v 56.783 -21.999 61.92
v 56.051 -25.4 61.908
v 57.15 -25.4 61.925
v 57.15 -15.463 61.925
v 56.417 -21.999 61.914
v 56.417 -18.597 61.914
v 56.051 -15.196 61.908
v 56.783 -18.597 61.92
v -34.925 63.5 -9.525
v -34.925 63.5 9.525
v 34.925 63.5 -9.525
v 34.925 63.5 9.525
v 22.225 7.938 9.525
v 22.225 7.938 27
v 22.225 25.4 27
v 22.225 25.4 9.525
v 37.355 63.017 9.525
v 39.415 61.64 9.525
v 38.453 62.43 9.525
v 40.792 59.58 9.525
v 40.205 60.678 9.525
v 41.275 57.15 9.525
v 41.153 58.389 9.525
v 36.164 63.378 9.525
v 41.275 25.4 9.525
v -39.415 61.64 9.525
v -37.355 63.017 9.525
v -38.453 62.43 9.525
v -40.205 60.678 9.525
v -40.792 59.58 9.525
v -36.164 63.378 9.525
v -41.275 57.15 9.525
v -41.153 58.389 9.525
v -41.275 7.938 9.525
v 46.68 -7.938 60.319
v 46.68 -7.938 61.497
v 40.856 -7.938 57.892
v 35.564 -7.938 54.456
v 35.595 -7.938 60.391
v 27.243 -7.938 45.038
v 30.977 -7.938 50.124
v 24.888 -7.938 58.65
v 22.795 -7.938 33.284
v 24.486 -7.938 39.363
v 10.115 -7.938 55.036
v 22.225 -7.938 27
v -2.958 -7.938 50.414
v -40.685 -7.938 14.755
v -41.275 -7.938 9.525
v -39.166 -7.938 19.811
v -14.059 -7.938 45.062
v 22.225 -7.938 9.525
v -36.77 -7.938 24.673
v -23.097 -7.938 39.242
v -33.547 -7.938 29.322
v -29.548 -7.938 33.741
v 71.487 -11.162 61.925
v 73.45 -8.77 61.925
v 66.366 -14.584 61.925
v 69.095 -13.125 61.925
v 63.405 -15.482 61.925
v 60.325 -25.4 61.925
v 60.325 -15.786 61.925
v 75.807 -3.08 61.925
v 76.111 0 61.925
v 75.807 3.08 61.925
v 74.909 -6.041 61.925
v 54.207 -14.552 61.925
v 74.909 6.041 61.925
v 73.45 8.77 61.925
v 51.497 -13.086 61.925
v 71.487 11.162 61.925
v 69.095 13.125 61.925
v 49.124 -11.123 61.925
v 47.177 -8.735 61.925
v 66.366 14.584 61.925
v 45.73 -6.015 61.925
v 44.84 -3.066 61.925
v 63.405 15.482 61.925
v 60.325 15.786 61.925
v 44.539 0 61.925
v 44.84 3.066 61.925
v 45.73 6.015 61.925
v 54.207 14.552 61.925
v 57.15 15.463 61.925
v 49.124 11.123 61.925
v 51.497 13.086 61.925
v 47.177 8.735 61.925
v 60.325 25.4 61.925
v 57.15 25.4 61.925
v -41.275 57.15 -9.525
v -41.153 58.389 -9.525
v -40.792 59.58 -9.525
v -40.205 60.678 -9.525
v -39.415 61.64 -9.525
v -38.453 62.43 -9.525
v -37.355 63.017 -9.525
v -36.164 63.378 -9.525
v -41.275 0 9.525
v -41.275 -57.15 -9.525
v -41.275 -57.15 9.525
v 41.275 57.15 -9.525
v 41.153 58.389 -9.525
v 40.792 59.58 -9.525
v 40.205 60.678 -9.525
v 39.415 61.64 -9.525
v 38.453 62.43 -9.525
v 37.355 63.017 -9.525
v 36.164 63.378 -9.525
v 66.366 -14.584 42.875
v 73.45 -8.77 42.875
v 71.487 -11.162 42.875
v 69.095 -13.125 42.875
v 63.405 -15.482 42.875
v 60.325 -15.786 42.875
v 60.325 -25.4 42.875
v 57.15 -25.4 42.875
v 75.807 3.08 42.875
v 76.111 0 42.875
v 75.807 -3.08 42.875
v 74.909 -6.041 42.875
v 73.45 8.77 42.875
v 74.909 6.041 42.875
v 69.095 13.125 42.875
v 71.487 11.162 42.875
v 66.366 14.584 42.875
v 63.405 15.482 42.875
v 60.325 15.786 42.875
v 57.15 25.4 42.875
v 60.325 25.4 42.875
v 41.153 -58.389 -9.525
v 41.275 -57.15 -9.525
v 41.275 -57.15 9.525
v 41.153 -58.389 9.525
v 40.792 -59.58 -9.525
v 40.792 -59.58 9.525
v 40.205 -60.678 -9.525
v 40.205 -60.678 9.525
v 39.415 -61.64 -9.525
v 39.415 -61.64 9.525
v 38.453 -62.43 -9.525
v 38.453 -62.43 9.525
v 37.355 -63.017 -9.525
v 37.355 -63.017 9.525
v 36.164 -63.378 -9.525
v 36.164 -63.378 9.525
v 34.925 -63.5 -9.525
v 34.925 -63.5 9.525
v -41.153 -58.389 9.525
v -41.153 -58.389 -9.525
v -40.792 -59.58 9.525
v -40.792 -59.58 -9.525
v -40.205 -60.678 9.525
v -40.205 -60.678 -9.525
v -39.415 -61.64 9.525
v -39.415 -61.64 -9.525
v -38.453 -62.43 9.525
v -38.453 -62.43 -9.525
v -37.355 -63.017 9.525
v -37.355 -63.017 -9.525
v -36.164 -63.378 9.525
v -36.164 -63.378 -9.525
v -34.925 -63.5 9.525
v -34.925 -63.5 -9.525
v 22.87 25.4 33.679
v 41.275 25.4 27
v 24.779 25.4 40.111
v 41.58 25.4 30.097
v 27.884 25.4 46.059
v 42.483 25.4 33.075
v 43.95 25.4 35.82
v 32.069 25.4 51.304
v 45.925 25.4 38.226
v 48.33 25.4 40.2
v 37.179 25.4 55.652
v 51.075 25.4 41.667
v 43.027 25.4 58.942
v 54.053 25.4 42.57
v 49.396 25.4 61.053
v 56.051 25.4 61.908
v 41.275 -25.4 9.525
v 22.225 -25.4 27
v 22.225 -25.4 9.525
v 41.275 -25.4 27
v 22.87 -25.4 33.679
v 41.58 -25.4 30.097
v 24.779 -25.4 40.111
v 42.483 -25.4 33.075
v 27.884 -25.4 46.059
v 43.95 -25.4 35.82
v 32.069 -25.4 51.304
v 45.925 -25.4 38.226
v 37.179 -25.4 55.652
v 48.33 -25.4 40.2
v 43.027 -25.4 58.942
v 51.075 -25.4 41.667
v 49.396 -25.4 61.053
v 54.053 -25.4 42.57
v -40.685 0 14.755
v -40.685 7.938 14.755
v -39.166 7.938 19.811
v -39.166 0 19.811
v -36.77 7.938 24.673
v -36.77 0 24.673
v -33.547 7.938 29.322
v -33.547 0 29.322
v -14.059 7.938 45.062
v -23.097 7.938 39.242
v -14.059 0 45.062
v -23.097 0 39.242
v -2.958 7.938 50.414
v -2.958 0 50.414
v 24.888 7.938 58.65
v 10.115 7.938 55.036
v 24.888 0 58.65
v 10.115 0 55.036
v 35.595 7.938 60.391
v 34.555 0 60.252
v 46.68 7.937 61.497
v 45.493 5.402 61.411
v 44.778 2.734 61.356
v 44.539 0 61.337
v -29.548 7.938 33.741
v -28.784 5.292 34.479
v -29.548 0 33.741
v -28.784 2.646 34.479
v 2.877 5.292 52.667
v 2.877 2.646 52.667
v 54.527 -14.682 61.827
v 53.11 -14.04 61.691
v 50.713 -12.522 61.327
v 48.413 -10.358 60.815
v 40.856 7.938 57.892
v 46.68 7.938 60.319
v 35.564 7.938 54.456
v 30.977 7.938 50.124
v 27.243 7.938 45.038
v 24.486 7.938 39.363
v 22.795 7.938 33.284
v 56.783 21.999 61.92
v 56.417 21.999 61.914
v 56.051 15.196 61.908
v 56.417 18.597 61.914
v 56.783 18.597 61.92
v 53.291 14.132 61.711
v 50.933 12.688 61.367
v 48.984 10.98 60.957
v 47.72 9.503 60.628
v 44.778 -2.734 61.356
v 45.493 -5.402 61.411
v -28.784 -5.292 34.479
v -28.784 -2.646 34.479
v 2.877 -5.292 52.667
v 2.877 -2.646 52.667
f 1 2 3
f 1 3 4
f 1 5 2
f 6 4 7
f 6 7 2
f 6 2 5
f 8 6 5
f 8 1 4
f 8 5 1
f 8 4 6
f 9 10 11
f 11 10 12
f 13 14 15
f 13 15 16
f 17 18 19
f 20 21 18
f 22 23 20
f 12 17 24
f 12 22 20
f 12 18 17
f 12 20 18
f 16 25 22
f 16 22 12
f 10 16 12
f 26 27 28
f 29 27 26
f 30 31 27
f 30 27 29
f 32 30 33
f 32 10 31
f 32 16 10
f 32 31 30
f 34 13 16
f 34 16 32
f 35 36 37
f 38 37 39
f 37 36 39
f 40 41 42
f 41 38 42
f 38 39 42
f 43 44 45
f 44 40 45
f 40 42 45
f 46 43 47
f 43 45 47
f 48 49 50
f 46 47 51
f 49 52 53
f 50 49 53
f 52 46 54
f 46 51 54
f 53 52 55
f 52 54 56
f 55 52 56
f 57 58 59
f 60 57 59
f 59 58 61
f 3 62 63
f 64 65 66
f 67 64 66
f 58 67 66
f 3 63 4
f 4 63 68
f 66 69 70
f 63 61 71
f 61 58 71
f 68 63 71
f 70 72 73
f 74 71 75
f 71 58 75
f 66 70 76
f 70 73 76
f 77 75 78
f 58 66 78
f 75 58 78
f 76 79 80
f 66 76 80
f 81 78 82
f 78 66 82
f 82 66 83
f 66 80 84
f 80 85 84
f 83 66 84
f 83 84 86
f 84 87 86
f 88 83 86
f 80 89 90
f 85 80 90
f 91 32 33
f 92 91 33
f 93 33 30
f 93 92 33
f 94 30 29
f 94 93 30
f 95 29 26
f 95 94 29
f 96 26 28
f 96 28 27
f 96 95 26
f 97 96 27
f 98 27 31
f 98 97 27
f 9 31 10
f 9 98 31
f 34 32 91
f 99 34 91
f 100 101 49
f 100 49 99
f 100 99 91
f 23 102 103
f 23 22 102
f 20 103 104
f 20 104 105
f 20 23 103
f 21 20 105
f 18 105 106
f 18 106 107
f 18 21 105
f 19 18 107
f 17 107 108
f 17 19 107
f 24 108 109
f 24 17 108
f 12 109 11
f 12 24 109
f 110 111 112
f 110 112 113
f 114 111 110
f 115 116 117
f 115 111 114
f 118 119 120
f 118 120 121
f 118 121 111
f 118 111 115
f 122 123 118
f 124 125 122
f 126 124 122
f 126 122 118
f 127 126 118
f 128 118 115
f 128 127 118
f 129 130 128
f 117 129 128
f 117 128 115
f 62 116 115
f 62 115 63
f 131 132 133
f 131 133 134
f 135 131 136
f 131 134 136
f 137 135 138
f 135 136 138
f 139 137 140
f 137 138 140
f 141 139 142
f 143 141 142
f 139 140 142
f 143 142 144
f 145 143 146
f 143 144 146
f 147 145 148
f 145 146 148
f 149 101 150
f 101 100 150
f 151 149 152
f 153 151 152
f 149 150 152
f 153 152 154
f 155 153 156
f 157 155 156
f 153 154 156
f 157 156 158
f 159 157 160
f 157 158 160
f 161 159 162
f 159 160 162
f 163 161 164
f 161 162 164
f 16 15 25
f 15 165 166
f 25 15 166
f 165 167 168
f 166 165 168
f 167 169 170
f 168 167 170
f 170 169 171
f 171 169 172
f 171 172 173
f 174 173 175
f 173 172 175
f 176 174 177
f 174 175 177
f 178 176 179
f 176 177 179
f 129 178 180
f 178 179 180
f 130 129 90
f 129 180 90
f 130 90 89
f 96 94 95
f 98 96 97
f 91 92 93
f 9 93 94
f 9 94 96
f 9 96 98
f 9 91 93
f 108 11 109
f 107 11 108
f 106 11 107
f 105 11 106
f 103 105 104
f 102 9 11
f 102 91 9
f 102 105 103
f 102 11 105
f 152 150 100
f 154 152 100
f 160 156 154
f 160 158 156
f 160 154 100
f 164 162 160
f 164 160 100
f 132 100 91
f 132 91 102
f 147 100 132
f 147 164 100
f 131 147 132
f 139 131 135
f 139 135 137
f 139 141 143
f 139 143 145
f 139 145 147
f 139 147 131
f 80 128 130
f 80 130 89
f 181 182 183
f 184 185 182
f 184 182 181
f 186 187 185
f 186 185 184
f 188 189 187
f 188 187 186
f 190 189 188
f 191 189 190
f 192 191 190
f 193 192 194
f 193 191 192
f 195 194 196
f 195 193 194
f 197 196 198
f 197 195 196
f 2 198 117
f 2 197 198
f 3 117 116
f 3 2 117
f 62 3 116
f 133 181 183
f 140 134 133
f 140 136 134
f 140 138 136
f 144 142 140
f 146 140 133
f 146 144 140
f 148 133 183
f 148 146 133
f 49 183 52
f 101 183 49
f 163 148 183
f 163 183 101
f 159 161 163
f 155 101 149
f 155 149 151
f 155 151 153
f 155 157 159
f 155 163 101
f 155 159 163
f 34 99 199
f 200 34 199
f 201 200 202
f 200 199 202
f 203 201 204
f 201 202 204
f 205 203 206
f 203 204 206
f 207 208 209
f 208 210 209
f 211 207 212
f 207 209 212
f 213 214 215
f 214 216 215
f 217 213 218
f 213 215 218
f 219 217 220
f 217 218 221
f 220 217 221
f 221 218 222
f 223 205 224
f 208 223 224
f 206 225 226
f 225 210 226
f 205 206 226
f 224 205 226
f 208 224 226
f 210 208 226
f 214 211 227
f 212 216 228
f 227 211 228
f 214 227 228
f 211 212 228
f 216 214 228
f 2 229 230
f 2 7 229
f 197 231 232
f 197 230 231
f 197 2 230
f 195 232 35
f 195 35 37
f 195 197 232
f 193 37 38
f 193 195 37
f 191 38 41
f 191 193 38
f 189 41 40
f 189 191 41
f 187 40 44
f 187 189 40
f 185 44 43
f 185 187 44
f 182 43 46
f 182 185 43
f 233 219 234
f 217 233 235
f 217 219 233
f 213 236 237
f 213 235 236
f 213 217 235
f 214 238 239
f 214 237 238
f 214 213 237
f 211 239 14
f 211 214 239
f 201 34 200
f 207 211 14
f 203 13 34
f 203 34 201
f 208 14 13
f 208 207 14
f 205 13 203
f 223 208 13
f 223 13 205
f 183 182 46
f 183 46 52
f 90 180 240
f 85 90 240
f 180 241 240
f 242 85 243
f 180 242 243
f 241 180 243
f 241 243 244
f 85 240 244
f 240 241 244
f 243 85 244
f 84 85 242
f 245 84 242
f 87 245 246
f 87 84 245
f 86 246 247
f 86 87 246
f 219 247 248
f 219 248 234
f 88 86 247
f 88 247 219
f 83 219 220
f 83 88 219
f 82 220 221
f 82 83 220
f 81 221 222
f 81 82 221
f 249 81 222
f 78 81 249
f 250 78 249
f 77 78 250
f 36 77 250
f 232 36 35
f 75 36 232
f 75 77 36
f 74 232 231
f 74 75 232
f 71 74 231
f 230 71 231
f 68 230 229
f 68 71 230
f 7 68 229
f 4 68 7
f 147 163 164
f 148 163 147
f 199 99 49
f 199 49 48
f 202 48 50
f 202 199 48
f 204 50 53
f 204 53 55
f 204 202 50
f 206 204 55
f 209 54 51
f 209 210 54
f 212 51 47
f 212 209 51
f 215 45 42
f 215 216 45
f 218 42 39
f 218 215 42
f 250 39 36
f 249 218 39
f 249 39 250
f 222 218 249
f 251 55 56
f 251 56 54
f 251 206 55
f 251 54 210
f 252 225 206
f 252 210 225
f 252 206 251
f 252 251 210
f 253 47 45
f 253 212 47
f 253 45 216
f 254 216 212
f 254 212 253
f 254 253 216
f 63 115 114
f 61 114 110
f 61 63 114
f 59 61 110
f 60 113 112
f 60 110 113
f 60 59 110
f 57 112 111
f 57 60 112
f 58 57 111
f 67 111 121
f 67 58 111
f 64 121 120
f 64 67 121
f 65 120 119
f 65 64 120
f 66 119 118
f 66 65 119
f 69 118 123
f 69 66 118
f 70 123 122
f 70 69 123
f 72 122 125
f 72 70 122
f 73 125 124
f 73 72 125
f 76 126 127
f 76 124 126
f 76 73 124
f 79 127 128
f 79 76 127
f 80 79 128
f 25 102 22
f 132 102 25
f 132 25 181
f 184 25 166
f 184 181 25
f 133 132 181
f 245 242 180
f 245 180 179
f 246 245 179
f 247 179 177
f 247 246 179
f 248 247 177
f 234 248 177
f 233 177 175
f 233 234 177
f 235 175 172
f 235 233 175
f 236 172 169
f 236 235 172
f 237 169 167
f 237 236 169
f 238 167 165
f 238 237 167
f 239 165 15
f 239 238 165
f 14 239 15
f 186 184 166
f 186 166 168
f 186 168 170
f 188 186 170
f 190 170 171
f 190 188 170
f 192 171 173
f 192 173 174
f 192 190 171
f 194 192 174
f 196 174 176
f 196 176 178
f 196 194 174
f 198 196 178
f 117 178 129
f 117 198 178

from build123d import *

# Parameters (mm, degrees)
F1_DEPTH = 63.5
F2_DEPTH = 25.4
F3_DEPTH = 7.9375
F0_W     = 15.7855516109
F0_H     = 19.05
F5_R     = 6.35


with BuildPart() as f1:
    # F0 (on Front) → F1 (new body, symmetric)
    with BuildSketch(Plane.XZ):
        Polygon((-41.275, 9.525), (-41.275, -9.525), (41.275, -9.525), (41.275, 9.525), (22.225, 9.525), align=None)
    extrude(amount=F1_DEPTH, both=True)

    # F0 (on Front) → F2 (join, symmetric)
    with BuildSketch(Plane.XZ):
        with BuildLine():
            Line((22.225, 9.525), (41.275, 9.525))
            Line((41.275, 9.525), (41.275, 27.0002))
            ThreePointArc((41.275, 27.0002), (45.9246798487, 38.2255201513), (57.15, 42.8752))
            Line((57.15, 42.8752), (60.325, 42.8752))
            Line((60.325, 42.8752), (60.325, 61.9252))
            Line((60.325, 61.9252), (57.15, 61.9252))
            add(Edge.make_bspline(
                [(56.0507958514, 61.9078979367), (56.4168804985, 61.9147360597), (56.7832864431, 61.9205050971), (57.15, 61.9252)],
                knots=[110.7182330401, 110.7182330401, 110.7182330401, 110.7182330401, 111.5045361635, 111.5045361635, 111.5045361635, 111.5045361635], degree=3))
            ThreePointArc((56.0507958514, 61.9078979367), (32.0686789633, 51.3041700472), (22.225, 27.0002))
            Line((22.225, 27.0002), (22.225, 9.525))
        make_face()
    extrude(amount=F2_DEPTH, both=True)

    # F0 (on Front) → F3 (join, symmetric)
    with BuildSketch(Plane.XZ):
        with BuildLine():
            add(Edge.make_bspline(
                [(-41.275, 9.525), (-40.6745437573, 38.785344003), (4.5029333836, 60.945031492), (56.0507958514, 61.9078979367)],
                knots=[0, 0, 0, 0, 110.7182330401, 110.7182330401, 110.7182330401, 110.7182330401], degree=3))
            Line((-41.275, 9.525), (22.225, 9.525))
            Line((22.225, 9.525), (22.225, 27.0002))
            ThreePointArc((22.225, 27.0002), (32.0686789633, 51.3041700472), (56.0507958514, 61.9078979367))
        make_face()
    extrude(amount=F3_DEPTH, both=True)

    # F0 (on Front) → F4 (revolve)
    with BuildSketch(Plane.XZ):
        with Locations((68.2177758054, 52.4002)):
            Rectangle(F0_W, F0_H)
    revolve(axis=Axis((60.325, 0, 52.3875), (0, 0, 1)))

    # F5
    f5_edges = [f1.edges().sort_by_distance(p)[0] for p in [
        (41.275, -63.5, 0),
        (-41.275, -63.5, 0),
        (41.275, 63.5, 0),
        (-41.275, 63.5, 0),
    ]]
    fillet(f5_edges, radius=F5_R)


solid = f1.part
